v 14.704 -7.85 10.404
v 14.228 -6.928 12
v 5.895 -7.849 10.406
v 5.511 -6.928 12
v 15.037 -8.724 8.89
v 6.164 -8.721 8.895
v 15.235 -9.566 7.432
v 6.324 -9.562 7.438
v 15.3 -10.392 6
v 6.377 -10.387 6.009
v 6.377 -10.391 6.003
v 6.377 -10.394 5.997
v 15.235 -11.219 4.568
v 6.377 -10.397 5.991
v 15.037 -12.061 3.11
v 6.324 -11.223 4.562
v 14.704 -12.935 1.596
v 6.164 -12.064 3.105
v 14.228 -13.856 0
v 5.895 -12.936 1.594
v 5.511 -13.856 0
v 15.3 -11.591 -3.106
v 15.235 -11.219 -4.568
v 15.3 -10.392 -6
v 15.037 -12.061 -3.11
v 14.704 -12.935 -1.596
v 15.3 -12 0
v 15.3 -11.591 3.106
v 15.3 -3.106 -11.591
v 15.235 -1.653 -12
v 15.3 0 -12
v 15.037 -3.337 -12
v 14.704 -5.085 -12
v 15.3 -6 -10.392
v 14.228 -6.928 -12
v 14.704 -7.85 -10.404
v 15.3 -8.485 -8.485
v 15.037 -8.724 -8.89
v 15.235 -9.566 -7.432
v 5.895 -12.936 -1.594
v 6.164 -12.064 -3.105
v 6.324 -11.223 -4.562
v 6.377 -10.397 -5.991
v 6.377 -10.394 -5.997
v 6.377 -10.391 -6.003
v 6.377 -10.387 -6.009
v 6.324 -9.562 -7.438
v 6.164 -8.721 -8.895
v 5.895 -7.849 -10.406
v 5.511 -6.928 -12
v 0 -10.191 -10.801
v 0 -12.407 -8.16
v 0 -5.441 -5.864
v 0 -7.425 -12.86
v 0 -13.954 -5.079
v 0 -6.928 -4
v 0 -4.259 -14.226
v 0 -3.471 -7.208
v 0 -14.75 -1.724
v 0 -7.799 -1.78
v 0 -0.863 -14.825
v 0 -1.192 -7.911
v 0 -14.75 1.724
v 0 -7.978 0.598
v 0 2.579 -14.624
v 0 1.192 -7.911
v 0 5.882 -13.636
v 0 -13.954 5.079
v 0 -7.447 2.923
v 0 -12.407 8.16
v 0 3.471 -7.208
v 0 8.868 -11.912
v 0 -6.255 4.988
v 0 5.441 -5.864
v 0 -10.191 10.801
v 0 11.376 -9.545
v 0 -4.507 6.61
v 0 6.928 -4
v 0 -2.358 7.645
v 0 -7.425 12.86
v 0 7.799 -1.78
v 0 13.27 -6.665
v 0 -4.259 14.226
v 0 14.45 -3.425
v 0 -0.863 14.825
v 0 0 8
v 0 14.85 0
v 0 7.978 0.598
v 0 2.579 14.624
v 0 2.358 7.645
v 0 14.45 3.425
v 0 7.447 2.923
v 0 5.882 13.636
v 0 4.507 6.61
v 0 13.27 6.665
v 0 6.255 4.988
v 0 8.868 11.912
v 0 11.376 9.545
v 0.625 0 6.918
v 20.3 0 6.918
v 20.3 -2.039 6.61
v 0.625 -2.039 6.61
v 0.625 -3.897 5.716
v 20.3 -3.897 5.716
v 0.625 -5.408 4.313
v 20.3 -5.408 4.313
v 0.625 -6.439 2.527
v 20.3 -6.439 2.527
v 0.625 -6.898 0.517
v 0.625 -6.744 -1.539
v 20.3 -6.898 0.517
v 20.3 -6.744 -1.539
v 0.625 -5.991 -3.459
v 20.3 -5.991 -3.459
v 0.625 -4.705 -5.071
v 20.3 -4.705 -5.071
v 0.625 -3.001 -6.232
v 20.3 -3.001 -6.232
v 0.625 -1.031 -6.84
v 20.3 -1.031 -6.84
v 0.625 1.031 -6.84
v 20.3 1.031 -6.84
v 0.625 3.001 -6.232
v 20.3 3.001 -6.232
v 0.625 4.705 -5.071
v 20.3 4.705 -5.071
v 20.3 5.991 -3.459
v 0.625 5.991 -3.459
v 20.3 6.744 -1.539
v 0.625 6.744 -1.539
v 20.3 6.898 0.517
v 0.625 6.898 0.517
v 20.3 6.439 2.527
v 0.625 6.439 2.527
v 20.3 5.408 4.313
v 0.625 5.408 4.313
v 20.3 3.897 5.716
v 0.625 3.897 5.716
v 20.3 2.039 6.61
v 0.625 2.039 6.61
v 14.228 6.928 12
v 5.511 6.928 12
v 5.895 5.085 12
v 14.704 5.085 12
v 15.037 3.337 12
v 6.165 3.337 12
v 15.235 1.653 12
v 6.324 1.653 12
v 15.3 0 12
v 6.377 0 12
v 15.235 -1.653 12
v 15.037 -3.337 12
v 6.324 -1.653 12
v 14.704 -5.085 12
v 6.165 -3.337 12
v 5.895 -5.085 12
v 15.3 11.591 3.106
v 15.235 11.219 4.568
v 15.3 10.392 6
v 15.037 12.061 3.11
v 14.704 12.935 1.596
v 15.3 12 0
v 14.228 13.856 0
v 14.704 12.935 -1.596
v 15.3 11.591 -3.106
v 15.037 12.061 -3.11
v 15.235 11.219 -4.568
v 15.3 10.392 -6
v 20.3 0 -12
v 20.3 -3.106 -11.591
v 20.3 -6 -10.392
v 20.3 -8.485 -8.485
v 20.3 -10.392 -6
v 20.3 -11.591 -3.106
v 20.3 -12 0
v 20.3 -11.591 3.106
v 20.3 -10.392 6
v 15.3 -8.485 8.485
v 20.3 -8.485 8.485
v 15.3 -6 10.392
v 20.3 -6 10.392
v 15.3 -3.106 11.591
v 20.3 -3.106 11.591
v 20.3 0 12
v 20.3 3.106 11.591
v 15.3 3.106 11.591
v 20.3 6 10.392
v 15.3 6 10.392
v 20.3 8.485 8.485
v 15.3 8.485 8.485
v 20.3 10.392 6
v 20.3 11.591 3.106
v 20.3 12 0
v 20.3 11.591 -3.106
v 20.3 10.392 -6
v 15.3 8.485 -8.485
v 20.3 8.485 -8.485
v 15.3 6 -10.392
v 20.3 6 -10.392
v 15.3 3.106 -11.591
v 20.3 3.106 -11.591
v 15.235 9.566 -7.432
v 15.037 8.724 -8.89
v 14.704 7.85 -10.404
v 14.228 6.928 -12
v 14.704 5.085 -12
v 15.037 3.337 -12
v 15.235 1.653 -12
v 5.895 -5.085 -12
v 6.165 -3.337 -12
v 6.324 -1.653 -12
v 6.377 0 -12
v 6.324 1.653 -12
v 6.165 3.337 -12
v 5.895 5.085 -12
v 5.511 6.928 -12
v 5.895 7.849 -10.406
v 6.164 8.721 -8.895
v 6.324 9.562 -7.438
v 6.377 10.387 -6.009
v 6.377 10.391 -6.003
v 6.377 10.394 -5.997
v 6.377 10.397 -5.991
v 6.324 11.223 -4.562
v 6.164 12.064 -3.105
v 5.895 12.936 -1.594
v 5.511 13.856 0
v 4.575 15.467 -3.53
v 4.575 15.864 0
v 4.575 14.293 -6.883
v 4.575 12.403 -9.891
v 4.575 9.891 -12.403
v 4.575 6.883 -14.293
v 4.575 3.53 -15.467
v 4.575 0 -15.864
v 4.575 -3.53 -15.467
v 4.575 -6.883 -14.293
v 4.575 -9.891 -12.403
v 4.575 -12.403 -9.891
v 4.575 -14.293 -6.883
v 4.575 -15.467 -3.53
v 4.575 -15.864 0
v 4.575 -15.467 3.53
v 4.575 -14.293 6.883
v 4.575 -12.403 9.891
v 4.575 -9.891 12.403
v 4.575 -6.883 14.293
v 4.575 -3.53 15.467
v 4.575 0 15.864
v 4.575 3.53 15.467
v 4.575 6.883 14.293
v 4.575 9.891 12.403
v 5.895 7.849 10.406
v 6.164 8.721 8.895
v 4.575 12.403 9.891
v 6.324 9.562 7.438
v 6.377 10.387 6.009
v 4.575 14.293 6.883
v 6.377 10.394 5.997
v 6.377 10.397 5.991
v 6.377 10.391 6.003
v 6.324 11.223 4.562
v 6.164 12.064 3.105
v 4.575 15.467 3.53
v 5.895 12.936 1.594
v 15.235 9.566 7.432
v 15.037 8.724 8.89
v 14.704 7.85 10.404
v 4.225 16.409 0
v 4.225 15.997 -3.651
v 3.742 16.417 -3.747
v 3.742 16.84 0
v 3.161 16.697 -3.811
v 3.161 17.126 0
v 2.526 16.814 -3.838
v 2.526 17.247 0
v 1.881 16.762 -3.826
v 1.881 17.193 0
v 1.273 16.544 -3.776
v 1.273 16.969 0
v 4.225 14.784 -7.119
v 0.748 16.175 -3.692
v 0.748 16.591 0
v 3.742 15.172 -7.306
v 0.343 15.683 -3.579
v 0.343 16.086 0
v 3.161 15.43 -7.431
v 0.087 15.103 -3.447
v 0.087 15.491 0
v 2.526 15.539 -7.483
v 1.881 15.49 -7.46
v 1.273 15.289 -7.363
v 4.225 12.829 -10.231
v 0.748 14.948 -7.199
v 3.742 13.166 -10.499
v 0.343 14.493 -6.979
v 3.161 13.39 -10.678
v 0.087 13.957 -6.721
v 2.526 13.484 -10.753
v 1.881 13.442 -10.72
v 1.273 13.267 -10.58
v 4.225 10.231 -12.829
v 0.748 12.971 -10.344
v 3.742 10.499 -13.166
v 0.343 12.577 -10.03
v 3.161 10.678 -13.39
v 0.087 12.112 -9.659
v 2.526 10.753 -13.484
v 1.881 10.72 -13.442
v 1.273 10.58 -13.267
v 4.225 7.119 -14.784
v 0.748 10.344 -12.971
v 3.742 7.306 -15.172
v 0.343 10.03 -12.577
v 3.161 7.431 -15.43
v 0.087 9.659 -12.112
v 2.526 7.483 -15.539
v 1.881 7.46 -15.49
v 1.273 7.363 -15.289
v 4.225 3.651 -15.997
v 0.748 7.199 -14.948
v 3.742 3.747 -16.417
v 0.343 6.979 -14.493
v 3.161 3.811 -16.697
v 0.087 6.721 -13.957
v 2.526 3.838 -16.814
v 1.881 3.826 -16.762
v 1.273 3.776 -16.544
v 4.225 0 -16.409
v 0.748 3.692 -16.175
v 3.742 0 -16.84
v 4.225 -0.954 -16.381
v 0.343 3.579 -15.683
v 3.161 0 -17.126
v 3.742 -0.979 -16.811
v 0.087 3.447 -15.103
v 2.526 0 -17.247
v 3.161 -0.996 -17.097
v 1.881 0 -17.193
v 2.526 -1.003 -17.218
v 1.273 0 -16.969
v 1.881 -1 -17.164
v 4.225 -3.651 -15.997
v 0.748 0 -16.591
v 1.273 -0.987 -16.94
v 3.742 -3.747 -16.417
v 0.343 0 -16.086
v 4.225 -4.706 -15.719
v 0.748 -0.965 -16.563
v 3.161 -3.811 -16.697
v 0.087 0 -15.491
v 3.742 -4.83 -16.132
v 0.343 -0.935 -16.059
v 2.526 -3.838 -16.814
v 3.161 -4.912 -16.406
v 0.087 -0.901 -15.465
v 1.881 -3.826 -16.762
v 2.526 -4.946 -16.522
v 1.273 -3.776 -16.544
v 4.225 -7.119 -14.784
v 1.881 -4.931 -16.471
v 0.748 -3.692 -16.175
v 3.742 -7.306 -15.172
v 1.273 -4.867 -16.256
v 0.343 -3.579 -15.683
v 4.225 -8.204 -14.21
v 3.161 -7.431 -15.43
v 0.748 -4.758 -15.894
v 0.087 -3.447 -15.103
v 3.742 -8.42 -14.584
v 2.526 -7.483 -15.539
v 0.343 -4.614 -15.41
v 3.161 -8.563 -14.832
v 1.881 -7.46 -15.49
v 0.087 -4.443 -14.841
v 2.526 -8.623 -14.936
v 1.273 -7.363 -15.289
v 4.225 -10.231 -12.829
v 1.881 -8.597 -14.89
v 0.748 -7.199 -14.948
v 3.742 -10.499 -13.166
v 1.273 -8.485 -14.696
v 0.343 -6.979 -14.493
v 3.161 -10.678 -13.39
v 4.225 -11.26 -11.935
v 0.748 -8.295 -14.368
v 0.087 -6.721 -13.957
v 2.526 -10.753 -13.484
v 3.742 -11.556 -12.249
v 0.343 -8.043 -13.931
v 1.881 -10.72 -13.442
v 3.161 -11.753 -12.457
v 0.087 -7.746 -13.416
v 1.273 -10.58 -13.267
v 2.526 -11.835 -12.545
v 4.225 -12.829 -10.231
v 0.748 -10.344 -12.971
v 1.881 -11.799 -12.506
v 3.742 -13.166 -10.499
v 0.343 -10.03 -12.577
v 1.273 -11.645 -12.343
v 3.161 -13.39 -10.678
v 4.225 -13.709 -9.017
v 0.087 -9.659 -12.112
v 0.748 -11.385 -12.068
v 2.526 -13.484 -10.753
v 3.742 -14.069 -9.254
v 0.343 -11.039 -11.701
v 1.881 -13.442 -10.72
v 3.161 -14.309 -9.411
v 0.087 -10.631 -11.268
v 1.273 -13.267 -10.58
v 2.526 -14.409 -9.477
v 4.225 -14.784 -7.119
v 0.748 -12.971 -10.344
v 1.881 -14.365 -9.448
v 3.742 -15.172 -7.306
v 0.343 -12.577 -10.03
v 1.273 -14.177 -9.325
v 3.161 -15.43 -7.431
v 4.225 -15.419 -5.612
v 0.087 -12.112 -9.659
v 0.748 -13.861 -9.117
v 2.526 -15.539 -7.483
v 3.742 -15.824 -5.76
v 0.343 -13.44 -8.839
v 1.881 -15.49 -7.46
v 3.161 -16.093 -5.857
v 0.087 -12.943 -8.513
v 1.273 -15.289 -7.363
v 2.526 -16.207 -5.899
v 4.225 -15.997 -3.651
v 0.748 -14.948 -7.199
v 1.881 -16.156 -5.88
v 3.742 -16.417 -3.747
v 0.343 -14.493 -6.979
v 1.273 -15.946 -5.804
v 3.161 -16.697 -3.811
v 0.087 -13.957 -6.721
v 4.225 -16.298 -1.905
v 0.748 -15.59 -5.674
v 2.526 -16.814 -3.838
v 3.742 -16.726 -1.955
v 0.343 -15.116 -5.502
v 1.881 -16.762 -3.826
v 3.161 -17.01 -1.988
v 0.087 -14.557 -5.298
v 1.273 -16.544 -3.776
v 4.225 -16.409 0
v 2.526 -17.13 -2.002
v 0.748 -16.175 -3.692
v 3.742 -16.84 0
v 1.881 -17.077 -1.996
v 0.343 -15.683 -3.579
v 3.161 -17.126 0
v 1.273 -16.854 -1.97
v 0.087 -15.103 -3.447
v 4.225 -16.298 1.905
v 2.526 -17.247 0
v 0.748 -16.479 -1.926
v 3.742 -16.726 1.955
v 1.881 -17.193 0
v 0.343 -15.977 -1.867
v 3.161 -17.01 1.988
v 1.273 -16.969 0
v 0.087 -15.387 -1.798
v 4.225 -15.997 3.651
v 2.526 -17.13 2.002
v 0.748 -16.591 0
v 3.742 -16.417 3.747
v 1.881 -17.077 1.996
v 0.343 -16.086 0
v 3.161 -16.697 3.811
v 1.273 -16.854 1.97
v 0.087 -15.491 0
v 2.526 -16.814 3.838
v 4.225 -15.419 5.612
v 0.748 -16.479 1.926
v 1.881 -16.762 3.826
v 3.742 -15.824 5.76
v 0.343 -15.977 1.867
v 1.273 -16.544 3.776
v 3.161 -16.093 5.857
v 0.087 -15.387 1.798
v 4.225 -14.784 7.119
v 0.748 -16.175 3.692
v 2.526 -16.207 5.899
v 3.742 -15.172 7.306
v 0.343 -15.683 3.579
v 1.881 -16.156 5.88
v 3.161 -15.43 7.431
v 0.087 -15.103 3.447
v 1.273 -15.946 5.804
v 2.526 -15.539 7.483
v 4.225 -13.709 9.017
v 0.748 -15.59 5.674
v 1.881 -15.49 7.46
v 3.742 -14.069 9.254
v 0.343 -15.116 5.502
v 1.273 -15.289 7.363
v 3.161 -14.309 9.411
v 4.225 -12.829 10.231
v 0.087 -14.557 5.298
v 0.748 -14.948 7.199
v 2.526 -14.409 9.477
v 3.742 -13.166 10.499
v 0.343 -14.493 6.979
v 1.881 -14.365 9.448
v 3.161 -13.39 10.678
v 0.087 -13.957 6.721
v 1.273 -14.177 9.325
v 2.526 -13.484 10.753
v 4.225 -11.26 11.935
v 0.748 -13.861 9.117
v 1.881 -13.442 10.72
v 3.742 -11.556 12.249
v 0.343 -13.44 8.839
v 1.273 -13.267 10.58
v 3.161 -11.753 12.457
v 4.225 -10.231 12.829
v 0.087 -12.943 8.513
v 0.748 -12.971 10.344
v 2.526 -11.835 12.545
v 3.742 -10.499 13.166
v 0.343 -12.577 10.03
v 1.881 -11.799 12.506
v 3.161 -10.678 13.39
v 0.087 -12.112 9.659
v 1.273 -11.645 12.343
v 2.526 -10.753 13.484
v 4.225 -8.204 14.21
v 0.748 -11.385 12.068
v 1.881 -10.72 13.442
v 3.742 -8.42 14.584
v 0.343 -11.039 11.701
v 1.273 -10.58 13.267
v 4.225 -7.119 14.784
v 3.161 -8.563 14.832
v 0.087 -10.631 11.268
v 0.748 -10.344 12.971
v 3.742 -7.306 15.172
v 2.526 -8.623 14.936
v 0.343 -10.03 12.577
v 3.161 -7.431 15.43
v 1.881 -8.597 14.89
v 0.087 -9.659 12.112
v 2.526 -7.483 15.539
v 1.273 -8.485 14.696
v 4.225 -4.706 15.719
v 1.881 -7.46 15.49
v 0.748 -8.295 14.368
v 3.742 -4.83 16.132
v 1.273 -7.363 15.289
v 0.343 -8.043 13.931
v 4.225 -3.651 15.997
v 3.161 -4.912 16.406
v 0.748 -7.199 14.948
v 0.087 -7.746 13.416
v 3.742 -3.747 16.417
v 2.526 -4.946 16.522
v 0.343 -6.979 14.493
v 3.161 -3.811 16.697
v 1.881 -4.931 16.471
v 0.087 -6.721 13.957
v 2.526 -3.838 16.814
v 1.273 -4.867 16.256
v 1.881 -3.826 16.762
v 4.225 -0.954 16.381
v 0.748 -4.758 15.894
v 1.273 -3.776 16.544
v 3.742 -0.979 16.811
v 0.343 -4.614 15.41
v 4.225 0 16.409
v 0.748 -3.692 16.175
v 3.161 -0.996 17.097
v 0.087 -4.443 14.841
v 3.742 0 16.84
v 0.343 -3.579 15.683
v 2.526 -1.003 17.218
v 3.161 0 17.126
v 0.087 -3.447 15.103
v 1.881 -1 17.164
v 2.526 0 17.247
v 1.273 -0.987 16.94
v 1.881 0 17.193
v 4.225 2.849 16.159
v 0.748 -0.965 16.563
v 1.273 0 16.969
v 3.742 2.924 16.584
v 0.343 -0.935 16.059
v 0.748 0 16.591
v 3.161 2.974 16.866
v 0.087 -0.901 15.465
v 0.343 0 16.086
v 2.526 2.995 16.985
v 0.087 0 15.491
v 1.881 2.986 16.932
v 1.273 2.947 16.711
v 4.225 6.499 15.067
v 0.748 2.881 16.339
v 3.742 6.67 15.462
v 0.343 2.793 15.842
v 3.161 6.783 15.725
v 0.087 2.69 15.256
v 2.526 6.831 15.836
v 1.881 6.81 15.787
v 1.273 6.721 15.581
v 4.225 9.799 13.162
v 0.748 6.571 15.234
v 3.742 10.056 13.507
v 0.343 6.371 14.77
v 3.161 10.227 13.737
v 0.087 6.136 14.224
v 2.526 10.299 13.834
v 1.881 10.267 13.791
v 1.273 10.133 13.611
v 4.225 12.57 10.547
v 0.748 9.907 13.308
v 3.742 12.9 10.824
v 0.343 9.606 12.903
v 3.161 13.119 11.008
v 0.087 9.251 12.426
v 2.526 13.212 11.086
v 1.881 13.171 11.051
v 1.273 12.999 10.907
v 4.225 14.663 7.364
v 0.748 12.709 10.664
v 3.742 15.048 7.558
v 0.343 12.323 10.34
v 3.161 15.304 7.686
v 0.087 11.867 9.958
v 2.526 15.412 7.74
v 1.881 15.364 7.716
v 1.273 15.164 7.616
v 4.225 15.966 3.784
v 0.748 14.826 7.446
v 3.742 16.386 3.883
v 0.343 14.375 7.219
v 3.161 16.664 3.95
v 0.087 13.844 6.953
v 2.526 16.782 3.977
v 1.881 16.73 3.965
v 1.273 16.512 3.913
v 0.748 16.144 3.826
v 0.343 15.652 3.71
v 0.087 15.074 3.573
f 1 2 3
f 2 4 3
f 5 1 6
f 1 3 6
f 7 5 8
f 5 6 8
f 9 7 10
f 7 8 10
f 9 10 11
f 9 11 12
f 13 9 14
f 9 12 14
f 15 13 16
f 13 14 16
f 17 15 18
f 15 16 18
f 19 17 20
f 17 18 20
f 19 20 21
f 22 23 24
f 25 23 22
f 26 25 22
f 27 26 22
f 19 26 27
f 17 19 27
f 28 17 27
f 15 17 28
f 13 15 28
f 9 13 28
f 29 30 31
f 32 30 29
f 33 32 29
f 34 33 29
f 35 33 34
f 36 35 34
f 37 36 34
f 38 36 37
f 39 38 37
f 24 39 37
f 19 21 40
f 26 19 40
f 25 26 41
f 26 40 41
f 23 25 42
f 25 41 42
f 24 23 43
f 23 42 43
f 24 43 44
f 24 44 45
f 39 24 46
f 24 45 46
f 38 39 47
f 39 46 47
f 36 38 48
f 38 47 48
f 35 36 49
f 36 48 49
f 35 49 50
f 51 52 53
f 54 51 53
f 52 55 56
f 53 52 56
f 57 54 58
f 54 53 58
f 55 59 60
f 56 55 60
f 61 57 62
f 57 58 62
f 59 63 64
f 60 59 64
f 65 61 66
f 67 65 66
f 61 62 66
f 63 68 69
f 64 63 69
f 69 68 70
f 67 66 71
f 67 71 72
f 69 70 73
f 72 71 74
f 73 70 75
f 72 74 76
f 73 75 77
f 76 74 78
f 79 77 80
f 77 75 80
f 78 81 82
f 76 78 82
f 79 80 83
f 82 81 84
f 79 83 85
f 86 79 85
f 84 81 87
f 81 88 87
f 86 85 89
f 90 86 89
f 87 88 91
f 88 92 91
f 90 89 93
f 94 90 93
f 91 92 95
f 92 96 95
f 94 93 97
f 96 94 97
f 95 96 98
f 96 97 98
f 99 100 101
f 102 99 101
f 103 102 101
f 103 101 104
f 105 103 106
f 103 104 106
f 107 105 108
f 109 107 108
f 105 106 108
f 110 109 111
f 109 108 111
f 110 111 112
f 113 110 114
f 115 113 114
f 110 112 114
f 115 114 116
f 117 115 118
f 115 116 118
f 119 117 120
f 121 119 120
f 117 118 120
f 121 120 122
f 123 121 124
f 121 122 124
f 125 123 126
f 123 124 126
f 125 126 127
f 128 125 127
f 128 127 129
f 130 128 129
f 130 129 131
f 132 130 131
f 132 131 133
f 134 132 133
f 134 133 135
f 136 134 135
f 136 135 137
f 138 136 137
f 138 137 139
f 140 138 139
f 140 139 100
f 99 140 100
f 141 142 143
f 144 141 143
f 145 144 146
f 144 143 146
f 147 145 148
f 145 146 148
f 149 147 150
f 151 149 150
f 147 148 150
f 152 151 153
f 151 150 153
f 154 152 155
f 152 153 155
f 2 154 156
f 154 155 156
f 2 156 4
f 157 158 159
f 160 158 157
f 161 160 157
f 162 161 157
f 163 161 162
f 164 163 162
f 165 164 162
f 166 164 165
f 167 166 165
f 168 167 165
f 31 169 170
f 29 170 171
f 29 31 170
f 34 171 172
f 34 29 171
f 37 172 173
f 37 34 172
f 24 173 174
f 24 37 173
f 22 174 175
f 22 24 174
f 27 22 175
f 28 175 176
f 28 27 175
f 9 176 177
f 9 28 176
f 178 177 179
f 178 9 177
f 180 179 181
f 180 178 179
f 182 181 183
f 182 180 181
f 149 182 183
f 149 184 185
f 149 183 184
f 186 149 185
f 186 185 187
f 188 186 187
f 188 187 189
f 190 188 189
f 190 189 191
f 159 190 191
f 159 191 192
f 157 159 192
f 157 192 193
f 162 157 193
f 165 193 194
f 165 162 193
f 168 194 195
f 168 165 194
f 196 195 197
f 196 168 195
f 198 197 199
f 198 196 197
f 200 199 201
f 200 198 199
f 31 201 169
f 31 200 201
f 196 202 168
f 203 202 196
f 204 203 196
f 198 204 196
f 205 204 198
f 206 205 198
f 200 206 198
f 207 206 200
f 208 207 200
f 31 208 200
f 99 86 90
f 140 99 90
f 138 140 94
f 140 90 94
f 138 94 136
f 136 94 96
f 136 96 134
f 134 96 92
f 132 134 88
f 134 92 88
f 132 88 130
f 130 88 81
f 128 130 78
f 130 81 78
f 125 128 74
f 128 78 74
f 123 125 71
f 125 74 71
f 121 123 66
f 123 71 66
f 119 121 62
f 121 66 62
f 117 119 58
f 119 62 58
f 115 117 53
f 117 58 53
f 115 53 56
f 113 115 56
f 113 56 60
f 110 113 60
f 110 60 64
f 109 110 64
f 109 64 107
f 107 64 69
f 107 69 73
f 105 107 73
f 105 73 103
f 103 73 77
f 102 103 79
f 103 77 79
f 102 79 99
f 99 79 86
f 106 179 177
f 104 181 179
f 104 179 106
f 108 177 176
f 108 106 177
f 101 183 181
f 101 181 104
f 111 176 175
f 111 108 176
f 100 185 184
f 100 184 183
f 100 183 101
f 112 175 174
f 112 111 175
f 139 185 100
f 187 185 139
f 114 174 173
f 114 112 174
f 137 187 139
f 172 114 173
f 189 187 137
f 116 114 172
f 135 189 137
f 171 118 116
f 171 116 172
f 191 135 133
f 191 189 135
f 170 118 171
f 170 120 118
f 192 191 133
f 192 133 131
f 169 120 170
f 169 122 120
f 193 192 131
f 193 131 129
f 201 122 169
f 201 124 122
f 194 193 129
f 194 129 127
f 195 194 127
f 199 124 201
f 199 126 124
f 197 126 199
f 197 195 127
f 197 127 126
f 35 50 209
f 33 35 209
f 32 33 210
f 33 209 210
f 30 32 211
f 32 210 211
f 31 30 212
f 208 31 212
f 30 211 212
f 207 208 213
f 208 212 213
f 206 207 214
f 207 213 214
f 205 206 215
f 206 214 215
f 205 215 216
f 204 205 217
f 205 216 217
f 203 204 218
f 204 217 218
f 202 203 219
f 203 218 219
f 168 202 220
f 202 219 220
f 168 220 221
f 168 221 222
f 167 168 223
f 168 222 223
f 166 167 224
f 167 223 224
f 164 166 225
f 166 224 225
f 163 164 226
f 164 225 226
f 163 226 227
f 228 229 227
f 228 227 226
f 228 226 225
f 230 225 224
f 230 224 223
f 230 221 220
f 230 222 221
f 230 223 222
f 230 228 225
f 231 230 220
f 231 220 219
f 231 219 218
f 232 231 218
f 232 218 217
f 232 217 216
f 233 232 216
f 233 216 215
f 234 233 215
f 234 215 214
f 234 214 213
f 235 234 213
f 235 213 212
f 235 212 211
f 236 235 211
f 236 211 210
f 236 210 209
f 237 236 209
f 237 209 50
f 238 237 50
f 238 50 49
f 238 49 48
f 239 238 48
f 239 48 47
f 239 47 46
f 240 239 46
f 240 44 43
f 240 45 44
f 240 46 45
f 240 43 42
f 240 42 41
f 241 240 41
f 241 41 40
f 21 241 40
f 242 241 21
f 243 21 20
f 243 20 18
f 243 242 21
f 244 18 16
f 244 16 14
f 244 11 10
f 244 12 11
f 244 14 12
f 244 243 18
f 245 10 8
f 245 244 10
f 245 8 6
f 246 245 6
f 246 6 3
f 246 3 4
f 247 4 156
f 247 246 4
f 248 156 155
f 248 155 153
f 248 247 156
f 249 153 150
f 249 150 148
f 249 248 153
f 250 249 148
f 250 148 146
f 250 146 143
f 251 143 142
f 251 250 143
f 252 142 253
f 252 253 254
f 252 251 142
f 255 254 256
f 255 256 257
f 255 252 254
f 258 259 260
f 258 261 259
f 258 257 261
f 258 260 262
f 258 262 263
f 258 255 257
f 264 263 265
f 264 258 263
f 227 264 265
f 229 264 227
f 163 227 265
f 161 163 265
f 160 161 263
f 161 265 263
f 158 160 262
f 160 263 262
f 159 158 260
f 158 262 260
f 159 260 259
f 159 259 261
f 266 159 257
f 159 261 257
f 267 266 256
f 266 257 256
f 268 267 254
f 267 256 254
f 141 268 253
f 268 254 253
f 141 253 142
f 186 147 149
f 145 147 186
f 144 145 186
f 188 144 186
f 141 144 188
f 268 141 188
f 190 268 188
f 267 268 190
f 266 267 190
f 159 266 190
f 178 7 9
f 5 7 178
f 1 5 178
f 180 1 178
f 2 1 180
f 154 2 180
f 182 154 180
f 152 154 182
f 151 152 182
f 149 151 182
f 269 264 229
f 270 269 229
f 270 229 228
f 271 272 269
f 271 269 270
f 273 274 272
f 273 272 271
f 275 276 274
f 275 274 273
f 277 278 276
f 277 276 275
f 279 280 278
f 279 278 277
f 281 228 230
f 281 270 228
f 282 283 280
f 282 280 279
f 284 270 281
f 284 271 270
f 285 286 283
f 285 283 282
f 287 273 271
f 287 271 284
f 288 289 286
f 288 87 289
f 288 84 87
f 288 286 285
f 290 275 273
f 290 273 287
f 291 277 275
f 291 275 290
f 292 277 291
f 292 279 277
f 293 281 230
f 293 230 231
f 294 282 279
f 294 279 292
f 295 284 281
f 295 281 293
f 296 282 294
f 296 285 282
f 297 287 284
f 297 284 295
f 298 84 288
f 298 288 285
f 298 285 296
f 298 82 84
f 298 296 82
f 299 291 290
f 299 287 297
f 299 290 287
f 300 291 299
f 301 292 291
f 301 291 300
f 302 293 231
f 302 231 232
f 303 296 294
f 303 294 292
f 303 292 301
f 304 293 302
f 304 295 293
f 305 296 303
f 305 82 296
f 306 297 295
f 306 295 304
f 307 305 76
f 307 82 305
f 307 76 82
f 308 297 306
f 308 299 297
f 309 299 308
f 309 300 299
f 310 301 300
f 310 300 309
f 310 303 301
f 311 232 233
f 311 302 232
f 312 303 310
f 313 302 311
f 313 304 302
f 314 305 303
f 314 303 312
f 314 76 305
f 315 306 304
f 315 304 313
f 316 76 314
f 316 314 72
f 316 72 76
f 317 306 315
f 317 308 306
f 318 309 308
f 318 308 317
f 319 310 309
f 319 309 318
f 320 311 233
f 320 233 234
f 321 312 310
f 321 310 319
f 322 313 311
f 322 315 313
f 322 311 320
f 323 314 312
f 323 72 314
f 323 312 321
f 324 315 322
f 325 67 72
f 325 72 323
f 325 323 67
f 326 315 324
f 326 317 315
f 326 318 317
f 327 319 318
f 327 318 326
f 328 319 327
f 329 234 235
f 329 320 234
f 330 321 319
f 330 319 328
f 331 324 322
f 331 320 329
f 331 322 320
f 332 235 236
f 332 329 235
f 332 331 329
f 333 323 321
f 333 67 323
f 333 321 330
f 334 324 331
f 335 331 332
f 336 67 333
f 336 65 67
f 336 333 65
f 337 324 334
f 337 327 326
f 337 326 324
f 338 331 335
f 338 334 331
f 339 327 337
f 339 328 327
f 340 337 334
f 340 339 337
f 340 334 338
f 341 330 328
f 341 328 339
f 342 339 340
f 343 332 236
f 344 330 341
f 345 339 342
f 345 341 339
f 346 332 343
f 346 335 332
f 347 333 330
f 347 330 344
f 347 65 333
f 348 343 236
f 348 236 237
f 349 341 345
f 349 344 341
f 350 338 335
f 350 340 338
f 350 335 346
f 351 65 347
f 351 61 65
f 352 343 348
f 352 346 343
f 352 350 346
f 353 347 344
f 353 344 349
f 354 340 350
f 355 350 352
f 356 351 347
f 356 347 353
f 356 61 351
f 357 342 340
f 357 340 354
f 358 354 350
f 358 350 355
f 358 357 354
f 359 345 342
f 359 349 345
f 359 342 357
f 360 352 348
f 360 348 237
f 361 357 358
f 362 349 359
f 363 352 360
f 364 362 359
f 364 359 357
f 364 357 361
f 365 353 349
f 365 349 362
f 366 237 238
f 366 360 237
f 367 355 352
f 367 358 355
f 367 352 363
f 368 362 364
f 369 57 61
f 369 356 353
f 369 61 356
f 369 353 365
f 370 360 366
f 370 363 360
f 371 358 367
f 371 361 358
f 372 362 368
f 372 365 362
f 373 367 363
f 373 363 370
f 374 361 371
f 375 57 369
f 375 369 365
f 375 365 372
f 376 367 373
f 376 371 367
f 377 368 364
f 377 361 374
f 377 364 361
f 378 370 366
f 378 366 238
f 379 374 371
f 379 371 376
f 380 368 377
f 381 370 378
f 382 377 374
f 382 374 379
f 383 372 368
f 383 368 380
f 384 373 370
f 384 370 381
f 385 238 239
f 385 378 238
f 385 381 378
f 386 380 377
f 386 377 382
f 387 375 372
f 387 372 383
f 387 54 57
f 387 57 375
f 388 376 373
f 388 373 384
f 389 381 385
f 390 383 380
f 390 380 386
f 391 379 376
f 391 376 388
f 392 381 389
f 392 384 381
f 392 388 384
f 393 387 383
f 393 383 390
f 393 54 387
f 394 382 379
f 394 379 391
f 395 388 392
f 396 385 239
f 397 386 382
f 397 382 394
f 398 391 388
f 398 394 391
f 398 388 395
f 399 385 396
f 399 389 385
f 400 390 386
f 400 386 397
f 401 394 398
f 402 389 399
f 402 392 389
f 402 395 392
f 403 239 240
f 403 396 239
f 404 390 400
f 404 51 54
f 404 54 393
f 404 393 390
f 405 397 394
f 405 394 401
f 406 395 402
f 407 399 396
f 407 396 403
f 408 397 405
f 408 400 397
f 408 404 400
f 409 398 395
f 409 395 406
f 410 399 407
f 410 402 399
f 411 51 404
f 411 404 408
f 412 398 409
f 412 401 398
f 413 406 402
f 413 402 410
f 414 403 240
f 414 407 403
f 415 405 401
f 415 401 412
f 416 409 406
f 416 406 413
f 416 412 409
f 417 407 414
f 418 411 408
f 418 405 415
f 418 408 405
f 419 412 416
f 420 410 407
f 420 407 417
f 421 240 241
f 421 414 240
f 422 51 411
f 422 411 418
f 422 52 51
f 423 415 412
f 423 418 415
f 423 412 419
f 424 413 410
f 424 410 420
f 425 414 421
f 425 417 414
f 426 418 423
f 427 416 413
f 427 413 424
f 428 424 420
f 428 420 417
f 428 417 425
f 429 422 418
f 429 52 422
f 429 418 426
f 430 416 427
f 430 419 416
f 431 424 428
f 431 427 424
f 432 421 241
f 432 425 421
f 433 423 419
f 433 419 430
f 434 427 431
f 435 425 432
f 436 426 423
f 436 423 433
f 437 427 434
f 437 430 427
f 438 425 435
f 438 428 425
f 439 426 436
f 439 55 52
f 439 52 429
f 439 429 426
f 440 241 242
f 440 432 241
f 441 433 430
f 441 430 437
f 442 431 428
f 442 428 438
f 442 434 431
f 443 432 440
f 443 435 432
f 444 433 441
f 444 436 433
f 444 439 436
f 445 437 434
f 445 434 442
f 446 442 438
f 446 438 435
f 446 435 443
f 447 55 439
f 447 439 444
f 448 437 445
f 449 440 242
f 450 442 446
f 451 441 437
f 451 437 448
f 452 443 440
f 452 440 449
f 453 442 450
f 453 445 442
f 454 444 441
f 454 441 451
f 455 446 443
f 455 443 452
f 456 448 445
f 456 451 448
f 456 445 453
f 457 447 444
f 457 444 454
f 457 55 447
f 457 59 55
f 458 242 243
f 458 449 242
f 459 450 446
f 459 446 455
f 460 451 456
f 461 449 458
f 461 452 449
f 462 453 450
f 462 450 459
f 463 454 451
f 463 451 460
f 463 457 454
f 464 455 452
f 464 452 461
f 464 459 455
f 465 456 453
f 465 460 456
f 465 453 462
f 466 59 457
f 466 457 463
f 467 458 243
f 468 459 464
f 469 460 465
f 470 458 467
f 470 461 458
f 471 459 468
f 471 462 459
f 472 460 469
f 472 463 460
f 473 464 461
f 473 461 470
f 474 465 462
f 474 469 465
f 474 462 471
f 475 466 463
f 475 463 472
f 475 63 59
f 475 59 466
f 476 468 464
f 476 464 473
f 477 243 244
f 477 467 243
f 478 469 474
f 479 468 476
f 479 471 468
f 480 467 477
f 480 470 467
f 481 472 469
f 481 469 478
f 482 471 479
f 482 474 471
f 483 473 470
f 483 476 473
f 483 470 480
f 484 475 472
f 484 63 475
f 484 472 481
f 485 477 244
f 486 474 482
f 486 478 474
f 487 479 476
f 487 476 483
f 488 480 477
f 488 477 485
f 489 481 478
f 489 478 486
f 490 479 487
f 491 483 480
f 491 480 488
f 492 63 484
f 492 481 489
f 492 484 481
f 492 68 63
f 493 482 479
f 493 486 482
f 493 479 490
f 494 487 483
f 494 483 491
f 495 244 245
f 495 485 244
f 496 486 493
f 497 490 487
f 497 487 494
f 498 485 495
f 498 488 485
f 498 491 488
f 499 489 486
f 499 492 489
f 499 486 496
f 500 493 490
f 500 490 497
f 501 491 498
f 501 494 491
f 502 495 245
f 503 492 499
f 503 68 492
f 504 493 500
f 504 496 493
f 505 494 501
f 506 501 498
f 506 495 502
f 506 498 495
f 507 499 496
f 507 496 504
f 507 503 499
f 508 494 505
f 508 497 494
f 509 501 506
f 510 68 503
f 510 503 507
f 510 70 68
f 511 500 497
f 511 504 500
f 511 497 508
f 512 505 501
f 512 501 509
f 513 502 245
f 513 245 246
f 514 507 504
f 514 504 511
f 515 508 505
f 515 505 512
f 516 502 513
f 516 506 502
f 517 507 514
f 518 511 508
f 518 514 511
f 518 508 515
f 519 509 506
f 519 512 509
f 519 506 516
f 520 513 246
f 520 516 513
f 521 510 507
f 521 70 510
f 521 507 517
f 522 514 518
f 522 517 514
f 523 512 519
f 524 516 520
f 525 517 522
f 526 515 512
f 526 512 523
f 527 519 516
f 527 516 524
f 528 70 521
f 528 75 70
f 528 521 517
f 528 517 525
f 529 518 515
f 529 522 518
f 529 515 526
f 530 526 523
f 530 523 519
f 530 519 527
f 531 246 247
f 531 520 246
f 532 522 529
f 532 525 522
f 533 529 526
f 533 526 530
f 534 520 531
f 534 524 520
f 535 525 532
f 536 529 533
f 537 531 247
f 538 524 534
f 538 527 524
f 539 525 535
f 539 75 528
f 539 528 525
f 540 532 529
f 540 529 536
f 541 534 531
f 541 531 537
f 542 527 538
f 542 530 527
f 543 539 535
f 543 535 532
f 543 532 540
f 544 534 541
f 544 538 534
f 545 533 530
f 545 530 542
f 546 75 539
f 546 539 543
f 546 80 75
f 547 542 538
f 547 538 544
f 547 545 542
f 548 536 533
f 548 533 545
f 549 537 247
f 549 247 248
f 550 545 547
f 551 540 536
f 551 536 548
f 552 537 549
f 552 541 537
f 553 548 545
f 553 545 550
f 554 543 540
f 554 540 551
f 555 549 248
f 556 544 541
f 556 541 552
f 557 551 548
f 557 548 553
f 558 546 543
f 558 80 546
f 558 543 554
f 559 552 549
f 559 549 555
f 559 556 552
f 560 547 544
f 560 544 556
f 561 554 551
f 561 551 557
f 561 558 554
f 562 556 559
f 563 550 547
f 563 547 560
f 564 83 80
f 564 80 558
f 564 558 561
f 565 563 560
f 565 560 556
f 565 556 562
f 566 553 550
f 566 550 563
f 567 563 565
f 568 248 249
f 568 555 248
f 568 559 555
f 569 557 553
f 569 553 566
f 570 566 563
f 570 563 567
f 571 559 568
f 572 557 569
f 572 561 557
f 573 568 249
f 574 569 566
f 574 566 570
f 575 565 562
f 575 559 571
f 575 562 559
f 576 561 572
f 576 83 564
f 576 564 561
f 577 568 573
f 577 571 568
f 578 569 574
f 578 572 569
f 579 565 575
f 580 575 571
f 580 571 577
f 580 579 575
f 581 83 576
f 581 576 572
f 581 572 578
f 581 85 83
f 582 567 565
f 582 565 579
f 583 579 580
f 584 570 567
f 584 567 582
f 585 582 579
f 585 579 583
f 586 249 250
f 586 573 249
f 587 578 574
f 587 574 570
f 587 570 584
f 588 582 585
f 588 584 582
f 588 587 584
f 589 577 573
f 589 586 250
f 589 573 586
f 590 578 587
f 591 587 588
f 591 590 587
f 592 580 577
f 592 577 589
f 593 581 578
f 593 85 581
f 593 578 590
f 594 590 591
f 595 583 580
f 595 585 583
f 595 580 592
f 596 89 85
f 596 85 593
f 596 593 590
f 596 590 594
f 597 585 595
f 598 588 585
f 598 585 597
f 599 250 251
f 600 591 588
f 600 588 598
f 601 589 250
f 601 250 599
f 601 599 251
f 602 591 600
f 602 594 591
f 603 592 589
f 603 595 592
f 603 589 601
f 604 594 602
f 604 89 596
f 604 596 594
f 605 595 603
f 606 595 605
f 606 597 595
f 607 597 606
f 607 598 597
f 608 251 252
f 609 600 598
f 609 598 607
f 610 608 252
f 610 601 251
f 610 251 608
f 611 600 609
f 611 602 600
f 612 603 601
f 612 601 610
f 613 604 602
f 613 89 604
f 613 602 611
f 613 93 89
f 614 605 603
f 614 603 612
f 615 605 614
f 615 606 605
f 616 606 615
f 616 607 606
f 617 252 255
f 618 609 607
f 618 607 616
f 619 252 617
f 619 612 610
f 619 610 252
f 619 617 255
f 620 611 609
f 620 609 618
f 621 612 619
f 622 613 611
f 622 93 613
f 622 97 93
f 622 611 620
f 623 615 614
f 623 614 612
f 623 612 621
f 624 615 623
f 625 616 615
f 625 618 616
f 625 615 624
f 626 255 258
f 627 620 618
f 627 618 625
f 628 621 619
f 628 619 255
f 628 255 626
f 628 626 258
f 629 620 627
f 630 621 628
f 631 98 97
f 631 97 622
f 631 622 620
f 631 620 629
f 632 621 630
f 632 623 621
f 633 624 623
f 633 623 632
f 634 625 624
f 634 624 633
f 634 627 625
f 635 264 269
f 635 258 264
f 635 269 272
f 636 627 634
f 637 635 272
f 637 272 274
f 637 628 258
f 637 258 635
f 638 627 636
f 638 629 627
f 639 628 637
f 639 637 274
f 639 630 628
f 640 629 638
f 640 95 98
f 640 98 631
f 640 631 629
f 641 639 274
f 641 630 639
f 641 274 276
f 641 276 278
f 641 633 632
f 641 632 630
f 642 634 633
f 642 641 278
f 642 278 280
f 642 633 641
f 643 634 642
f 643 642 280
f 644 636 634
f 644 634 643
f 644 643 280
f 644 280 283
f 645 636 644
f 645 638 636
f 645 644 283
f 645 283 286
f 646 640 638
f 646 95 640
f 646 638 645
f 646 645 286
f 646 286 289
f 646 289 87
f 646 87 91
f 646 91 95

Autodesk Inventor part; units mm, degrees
ref_plane "YZ Plane" through (0, 0, 0) normal (1, 0, 0) x (0, 1, 0)
ref_plane "XZ Plane" through (0, 0, 0) normal (0, 1, 0) x (-1, 0, 0)
sketch "Schizzo1" plane through (0, 0, 0) normal (0, 0, 1) x (1, 0, 0)
  line L0 (-4.5484, 0) -> (24.4414, 0) projected
  line L1 (6.3771, 12) -> (4.5751, 15.8643)
  line L2 (6.3771, 12) -> (20.3, 12) construction
  line L3 (20.3, 12) -> (20.3, 0) construction
  arc A0 (4.5751, 15.8643) -> (0, 14.85) centre (2.4, 14.85) ccw
  line L4 (6.3771, 12) -> (6.3771, 0)
  line L5 (0, -3.5401) -> (0, 21.2403) projected
  point P0 (0, 0)
  dimension "d1" = 24
  dimension "d3" = 34.5
  dimension "d4" = 2.4
  dimension "d16" = 20.3
  dimension "d17" = 25
revolve "Anello" add sketch "Schizzo1" angle 360 about axis through (-10, 0, 0) along (1, 0, 0)
sketch "Schizzo2" plane through (0, 0, 0) normal (-1, 0, 0) x (0, 0, 1)
  circle A0 centre (0, 0) radius 4.9
  line L0 (-12, -6.9282) -> (-12, 6.9282)
  line L1 (-12, 6.9282) -> (0, 13.8564)
  line L2 (0, 13.8564) -> (12, 6.9282)
  line L3 (12, 6.9282) -> (12, -6.9282)
  line L4 (12, -6.9282) -> (0, -13.8564)
  line L5 (0, -13.8564) -> (-12, -6.9282)
  circle A1 centre (0, 0) radius 14.85 projected
  dimension "d5" = 27.7128
extrude "Corpo" add sketch "Schizzo2" against normal blind 15.3 contours A0 | L0 L1 L2 L3 L4 L5
sketch "Schizzo3" plane through (15.3, 0, 0) normal (1, 0, 0) x (0, 0, -1)
  circle A0 centre (0, 0) radius 12
  dimension "d19" = 24
extrude "Corona" add sketch "Schizzo3" along normal blind 5
sketch "Schizzo4" plane through (0, 0, 0) normal (-1, 0, 0) x (0, 0, 1)
  circle A0 centre (0, 0) radius 4.9
  circle A1 centre (0, 0) radius 14.85 projected
hole "Filettatura" at (0, 0, 0) direction (1, 0, 0) diameter 13.835 end through all thread size "M16x2" class "6H" standard "ISO Metric profile"
sketch "Schizzo5" plane through (0, 0, 0) normal (0, 0, 1) x (1, 0, 0)
  line L0 (5.5114, 13.8564) -> (15.3, 13.8564) projected
  line L1 (15.3, 6.9282) -> (15.3, 13.8564) projected
  line L2 (0, -14.85) -> (0, 14.85) projected
  line L3 (-3.06, 0) -> (18.36, 0) projected
  line L4 (14.2282, 13.8564) -> (15.3, 12)
  dimension "d9" = 30
  dimension "d10" = 24
revolve "Smusso1" cut sketch "Schizzo5" angle 360 about axis through (-10, 0, 0) along (1, 0, 0)
chamfer "Smusso2" distance 1.0825 angle 30 1 edges at (0, 0, -6.9175) measured on face at (0, 12.0452, -1.4626)
ref_plane "Work Plane1" through (52.845, 0, 0) normal (0, 0, -1) x (-1, 0, 0)
equation "\"d1\" = SW"
equation "\"d3\" = LADI"
equation "\"d4\" = PHH"
equation "\"d16\" = KOH"
equation "\"d17\" = KEWI"
equation "\"d5\" = 1.1547 * SW"
equation "\"d6\" = KOH1"
equation "\"d19\" = SD2"
equation "\"d11\" = KOH - KOH1"
equation "\"d9\" = ANG1"
equation "\"d10\" = SW0"
equation "\"d13\" = -0.5 * GD1 + 0.5 * NND"
equation "\"d57\" = -0.5 * GD1 + 0.5 * NND"
equation "\"ANG1\" = 30deg"
equation "\"KEWI\" = 25deg"
equation "\"NND\" = 16"
equation "\"LADI\" = 34.5"
equation "\"SW\" = 24"
equation "\"PHH\" = 2.4"
equation "\"KOH\" = 20.3"
equation "\"SW0\" = SW"
equation "\"d0\" = LADI"
equation "\"d2\" = PHH"
equation "\"KOH1\" = 15.3"
equation "\"SD2\" = SW"
equation "\"GUL\" = 0.541266 * PTC"
equation "\"RR\" = PHH"
equation "\"THREADDIA\" = 16"
equation "\"TOA\" = 30deg"
equation "\"PTC\" = 2"
equation "\"GAL\" = 0.541266 * PTC"
equation "\"E0\" = 1.155 * SW"
equation "\"GD1\" = 13.834936"
properties part number "ISO 7043 - M16" material "Acciaio"
